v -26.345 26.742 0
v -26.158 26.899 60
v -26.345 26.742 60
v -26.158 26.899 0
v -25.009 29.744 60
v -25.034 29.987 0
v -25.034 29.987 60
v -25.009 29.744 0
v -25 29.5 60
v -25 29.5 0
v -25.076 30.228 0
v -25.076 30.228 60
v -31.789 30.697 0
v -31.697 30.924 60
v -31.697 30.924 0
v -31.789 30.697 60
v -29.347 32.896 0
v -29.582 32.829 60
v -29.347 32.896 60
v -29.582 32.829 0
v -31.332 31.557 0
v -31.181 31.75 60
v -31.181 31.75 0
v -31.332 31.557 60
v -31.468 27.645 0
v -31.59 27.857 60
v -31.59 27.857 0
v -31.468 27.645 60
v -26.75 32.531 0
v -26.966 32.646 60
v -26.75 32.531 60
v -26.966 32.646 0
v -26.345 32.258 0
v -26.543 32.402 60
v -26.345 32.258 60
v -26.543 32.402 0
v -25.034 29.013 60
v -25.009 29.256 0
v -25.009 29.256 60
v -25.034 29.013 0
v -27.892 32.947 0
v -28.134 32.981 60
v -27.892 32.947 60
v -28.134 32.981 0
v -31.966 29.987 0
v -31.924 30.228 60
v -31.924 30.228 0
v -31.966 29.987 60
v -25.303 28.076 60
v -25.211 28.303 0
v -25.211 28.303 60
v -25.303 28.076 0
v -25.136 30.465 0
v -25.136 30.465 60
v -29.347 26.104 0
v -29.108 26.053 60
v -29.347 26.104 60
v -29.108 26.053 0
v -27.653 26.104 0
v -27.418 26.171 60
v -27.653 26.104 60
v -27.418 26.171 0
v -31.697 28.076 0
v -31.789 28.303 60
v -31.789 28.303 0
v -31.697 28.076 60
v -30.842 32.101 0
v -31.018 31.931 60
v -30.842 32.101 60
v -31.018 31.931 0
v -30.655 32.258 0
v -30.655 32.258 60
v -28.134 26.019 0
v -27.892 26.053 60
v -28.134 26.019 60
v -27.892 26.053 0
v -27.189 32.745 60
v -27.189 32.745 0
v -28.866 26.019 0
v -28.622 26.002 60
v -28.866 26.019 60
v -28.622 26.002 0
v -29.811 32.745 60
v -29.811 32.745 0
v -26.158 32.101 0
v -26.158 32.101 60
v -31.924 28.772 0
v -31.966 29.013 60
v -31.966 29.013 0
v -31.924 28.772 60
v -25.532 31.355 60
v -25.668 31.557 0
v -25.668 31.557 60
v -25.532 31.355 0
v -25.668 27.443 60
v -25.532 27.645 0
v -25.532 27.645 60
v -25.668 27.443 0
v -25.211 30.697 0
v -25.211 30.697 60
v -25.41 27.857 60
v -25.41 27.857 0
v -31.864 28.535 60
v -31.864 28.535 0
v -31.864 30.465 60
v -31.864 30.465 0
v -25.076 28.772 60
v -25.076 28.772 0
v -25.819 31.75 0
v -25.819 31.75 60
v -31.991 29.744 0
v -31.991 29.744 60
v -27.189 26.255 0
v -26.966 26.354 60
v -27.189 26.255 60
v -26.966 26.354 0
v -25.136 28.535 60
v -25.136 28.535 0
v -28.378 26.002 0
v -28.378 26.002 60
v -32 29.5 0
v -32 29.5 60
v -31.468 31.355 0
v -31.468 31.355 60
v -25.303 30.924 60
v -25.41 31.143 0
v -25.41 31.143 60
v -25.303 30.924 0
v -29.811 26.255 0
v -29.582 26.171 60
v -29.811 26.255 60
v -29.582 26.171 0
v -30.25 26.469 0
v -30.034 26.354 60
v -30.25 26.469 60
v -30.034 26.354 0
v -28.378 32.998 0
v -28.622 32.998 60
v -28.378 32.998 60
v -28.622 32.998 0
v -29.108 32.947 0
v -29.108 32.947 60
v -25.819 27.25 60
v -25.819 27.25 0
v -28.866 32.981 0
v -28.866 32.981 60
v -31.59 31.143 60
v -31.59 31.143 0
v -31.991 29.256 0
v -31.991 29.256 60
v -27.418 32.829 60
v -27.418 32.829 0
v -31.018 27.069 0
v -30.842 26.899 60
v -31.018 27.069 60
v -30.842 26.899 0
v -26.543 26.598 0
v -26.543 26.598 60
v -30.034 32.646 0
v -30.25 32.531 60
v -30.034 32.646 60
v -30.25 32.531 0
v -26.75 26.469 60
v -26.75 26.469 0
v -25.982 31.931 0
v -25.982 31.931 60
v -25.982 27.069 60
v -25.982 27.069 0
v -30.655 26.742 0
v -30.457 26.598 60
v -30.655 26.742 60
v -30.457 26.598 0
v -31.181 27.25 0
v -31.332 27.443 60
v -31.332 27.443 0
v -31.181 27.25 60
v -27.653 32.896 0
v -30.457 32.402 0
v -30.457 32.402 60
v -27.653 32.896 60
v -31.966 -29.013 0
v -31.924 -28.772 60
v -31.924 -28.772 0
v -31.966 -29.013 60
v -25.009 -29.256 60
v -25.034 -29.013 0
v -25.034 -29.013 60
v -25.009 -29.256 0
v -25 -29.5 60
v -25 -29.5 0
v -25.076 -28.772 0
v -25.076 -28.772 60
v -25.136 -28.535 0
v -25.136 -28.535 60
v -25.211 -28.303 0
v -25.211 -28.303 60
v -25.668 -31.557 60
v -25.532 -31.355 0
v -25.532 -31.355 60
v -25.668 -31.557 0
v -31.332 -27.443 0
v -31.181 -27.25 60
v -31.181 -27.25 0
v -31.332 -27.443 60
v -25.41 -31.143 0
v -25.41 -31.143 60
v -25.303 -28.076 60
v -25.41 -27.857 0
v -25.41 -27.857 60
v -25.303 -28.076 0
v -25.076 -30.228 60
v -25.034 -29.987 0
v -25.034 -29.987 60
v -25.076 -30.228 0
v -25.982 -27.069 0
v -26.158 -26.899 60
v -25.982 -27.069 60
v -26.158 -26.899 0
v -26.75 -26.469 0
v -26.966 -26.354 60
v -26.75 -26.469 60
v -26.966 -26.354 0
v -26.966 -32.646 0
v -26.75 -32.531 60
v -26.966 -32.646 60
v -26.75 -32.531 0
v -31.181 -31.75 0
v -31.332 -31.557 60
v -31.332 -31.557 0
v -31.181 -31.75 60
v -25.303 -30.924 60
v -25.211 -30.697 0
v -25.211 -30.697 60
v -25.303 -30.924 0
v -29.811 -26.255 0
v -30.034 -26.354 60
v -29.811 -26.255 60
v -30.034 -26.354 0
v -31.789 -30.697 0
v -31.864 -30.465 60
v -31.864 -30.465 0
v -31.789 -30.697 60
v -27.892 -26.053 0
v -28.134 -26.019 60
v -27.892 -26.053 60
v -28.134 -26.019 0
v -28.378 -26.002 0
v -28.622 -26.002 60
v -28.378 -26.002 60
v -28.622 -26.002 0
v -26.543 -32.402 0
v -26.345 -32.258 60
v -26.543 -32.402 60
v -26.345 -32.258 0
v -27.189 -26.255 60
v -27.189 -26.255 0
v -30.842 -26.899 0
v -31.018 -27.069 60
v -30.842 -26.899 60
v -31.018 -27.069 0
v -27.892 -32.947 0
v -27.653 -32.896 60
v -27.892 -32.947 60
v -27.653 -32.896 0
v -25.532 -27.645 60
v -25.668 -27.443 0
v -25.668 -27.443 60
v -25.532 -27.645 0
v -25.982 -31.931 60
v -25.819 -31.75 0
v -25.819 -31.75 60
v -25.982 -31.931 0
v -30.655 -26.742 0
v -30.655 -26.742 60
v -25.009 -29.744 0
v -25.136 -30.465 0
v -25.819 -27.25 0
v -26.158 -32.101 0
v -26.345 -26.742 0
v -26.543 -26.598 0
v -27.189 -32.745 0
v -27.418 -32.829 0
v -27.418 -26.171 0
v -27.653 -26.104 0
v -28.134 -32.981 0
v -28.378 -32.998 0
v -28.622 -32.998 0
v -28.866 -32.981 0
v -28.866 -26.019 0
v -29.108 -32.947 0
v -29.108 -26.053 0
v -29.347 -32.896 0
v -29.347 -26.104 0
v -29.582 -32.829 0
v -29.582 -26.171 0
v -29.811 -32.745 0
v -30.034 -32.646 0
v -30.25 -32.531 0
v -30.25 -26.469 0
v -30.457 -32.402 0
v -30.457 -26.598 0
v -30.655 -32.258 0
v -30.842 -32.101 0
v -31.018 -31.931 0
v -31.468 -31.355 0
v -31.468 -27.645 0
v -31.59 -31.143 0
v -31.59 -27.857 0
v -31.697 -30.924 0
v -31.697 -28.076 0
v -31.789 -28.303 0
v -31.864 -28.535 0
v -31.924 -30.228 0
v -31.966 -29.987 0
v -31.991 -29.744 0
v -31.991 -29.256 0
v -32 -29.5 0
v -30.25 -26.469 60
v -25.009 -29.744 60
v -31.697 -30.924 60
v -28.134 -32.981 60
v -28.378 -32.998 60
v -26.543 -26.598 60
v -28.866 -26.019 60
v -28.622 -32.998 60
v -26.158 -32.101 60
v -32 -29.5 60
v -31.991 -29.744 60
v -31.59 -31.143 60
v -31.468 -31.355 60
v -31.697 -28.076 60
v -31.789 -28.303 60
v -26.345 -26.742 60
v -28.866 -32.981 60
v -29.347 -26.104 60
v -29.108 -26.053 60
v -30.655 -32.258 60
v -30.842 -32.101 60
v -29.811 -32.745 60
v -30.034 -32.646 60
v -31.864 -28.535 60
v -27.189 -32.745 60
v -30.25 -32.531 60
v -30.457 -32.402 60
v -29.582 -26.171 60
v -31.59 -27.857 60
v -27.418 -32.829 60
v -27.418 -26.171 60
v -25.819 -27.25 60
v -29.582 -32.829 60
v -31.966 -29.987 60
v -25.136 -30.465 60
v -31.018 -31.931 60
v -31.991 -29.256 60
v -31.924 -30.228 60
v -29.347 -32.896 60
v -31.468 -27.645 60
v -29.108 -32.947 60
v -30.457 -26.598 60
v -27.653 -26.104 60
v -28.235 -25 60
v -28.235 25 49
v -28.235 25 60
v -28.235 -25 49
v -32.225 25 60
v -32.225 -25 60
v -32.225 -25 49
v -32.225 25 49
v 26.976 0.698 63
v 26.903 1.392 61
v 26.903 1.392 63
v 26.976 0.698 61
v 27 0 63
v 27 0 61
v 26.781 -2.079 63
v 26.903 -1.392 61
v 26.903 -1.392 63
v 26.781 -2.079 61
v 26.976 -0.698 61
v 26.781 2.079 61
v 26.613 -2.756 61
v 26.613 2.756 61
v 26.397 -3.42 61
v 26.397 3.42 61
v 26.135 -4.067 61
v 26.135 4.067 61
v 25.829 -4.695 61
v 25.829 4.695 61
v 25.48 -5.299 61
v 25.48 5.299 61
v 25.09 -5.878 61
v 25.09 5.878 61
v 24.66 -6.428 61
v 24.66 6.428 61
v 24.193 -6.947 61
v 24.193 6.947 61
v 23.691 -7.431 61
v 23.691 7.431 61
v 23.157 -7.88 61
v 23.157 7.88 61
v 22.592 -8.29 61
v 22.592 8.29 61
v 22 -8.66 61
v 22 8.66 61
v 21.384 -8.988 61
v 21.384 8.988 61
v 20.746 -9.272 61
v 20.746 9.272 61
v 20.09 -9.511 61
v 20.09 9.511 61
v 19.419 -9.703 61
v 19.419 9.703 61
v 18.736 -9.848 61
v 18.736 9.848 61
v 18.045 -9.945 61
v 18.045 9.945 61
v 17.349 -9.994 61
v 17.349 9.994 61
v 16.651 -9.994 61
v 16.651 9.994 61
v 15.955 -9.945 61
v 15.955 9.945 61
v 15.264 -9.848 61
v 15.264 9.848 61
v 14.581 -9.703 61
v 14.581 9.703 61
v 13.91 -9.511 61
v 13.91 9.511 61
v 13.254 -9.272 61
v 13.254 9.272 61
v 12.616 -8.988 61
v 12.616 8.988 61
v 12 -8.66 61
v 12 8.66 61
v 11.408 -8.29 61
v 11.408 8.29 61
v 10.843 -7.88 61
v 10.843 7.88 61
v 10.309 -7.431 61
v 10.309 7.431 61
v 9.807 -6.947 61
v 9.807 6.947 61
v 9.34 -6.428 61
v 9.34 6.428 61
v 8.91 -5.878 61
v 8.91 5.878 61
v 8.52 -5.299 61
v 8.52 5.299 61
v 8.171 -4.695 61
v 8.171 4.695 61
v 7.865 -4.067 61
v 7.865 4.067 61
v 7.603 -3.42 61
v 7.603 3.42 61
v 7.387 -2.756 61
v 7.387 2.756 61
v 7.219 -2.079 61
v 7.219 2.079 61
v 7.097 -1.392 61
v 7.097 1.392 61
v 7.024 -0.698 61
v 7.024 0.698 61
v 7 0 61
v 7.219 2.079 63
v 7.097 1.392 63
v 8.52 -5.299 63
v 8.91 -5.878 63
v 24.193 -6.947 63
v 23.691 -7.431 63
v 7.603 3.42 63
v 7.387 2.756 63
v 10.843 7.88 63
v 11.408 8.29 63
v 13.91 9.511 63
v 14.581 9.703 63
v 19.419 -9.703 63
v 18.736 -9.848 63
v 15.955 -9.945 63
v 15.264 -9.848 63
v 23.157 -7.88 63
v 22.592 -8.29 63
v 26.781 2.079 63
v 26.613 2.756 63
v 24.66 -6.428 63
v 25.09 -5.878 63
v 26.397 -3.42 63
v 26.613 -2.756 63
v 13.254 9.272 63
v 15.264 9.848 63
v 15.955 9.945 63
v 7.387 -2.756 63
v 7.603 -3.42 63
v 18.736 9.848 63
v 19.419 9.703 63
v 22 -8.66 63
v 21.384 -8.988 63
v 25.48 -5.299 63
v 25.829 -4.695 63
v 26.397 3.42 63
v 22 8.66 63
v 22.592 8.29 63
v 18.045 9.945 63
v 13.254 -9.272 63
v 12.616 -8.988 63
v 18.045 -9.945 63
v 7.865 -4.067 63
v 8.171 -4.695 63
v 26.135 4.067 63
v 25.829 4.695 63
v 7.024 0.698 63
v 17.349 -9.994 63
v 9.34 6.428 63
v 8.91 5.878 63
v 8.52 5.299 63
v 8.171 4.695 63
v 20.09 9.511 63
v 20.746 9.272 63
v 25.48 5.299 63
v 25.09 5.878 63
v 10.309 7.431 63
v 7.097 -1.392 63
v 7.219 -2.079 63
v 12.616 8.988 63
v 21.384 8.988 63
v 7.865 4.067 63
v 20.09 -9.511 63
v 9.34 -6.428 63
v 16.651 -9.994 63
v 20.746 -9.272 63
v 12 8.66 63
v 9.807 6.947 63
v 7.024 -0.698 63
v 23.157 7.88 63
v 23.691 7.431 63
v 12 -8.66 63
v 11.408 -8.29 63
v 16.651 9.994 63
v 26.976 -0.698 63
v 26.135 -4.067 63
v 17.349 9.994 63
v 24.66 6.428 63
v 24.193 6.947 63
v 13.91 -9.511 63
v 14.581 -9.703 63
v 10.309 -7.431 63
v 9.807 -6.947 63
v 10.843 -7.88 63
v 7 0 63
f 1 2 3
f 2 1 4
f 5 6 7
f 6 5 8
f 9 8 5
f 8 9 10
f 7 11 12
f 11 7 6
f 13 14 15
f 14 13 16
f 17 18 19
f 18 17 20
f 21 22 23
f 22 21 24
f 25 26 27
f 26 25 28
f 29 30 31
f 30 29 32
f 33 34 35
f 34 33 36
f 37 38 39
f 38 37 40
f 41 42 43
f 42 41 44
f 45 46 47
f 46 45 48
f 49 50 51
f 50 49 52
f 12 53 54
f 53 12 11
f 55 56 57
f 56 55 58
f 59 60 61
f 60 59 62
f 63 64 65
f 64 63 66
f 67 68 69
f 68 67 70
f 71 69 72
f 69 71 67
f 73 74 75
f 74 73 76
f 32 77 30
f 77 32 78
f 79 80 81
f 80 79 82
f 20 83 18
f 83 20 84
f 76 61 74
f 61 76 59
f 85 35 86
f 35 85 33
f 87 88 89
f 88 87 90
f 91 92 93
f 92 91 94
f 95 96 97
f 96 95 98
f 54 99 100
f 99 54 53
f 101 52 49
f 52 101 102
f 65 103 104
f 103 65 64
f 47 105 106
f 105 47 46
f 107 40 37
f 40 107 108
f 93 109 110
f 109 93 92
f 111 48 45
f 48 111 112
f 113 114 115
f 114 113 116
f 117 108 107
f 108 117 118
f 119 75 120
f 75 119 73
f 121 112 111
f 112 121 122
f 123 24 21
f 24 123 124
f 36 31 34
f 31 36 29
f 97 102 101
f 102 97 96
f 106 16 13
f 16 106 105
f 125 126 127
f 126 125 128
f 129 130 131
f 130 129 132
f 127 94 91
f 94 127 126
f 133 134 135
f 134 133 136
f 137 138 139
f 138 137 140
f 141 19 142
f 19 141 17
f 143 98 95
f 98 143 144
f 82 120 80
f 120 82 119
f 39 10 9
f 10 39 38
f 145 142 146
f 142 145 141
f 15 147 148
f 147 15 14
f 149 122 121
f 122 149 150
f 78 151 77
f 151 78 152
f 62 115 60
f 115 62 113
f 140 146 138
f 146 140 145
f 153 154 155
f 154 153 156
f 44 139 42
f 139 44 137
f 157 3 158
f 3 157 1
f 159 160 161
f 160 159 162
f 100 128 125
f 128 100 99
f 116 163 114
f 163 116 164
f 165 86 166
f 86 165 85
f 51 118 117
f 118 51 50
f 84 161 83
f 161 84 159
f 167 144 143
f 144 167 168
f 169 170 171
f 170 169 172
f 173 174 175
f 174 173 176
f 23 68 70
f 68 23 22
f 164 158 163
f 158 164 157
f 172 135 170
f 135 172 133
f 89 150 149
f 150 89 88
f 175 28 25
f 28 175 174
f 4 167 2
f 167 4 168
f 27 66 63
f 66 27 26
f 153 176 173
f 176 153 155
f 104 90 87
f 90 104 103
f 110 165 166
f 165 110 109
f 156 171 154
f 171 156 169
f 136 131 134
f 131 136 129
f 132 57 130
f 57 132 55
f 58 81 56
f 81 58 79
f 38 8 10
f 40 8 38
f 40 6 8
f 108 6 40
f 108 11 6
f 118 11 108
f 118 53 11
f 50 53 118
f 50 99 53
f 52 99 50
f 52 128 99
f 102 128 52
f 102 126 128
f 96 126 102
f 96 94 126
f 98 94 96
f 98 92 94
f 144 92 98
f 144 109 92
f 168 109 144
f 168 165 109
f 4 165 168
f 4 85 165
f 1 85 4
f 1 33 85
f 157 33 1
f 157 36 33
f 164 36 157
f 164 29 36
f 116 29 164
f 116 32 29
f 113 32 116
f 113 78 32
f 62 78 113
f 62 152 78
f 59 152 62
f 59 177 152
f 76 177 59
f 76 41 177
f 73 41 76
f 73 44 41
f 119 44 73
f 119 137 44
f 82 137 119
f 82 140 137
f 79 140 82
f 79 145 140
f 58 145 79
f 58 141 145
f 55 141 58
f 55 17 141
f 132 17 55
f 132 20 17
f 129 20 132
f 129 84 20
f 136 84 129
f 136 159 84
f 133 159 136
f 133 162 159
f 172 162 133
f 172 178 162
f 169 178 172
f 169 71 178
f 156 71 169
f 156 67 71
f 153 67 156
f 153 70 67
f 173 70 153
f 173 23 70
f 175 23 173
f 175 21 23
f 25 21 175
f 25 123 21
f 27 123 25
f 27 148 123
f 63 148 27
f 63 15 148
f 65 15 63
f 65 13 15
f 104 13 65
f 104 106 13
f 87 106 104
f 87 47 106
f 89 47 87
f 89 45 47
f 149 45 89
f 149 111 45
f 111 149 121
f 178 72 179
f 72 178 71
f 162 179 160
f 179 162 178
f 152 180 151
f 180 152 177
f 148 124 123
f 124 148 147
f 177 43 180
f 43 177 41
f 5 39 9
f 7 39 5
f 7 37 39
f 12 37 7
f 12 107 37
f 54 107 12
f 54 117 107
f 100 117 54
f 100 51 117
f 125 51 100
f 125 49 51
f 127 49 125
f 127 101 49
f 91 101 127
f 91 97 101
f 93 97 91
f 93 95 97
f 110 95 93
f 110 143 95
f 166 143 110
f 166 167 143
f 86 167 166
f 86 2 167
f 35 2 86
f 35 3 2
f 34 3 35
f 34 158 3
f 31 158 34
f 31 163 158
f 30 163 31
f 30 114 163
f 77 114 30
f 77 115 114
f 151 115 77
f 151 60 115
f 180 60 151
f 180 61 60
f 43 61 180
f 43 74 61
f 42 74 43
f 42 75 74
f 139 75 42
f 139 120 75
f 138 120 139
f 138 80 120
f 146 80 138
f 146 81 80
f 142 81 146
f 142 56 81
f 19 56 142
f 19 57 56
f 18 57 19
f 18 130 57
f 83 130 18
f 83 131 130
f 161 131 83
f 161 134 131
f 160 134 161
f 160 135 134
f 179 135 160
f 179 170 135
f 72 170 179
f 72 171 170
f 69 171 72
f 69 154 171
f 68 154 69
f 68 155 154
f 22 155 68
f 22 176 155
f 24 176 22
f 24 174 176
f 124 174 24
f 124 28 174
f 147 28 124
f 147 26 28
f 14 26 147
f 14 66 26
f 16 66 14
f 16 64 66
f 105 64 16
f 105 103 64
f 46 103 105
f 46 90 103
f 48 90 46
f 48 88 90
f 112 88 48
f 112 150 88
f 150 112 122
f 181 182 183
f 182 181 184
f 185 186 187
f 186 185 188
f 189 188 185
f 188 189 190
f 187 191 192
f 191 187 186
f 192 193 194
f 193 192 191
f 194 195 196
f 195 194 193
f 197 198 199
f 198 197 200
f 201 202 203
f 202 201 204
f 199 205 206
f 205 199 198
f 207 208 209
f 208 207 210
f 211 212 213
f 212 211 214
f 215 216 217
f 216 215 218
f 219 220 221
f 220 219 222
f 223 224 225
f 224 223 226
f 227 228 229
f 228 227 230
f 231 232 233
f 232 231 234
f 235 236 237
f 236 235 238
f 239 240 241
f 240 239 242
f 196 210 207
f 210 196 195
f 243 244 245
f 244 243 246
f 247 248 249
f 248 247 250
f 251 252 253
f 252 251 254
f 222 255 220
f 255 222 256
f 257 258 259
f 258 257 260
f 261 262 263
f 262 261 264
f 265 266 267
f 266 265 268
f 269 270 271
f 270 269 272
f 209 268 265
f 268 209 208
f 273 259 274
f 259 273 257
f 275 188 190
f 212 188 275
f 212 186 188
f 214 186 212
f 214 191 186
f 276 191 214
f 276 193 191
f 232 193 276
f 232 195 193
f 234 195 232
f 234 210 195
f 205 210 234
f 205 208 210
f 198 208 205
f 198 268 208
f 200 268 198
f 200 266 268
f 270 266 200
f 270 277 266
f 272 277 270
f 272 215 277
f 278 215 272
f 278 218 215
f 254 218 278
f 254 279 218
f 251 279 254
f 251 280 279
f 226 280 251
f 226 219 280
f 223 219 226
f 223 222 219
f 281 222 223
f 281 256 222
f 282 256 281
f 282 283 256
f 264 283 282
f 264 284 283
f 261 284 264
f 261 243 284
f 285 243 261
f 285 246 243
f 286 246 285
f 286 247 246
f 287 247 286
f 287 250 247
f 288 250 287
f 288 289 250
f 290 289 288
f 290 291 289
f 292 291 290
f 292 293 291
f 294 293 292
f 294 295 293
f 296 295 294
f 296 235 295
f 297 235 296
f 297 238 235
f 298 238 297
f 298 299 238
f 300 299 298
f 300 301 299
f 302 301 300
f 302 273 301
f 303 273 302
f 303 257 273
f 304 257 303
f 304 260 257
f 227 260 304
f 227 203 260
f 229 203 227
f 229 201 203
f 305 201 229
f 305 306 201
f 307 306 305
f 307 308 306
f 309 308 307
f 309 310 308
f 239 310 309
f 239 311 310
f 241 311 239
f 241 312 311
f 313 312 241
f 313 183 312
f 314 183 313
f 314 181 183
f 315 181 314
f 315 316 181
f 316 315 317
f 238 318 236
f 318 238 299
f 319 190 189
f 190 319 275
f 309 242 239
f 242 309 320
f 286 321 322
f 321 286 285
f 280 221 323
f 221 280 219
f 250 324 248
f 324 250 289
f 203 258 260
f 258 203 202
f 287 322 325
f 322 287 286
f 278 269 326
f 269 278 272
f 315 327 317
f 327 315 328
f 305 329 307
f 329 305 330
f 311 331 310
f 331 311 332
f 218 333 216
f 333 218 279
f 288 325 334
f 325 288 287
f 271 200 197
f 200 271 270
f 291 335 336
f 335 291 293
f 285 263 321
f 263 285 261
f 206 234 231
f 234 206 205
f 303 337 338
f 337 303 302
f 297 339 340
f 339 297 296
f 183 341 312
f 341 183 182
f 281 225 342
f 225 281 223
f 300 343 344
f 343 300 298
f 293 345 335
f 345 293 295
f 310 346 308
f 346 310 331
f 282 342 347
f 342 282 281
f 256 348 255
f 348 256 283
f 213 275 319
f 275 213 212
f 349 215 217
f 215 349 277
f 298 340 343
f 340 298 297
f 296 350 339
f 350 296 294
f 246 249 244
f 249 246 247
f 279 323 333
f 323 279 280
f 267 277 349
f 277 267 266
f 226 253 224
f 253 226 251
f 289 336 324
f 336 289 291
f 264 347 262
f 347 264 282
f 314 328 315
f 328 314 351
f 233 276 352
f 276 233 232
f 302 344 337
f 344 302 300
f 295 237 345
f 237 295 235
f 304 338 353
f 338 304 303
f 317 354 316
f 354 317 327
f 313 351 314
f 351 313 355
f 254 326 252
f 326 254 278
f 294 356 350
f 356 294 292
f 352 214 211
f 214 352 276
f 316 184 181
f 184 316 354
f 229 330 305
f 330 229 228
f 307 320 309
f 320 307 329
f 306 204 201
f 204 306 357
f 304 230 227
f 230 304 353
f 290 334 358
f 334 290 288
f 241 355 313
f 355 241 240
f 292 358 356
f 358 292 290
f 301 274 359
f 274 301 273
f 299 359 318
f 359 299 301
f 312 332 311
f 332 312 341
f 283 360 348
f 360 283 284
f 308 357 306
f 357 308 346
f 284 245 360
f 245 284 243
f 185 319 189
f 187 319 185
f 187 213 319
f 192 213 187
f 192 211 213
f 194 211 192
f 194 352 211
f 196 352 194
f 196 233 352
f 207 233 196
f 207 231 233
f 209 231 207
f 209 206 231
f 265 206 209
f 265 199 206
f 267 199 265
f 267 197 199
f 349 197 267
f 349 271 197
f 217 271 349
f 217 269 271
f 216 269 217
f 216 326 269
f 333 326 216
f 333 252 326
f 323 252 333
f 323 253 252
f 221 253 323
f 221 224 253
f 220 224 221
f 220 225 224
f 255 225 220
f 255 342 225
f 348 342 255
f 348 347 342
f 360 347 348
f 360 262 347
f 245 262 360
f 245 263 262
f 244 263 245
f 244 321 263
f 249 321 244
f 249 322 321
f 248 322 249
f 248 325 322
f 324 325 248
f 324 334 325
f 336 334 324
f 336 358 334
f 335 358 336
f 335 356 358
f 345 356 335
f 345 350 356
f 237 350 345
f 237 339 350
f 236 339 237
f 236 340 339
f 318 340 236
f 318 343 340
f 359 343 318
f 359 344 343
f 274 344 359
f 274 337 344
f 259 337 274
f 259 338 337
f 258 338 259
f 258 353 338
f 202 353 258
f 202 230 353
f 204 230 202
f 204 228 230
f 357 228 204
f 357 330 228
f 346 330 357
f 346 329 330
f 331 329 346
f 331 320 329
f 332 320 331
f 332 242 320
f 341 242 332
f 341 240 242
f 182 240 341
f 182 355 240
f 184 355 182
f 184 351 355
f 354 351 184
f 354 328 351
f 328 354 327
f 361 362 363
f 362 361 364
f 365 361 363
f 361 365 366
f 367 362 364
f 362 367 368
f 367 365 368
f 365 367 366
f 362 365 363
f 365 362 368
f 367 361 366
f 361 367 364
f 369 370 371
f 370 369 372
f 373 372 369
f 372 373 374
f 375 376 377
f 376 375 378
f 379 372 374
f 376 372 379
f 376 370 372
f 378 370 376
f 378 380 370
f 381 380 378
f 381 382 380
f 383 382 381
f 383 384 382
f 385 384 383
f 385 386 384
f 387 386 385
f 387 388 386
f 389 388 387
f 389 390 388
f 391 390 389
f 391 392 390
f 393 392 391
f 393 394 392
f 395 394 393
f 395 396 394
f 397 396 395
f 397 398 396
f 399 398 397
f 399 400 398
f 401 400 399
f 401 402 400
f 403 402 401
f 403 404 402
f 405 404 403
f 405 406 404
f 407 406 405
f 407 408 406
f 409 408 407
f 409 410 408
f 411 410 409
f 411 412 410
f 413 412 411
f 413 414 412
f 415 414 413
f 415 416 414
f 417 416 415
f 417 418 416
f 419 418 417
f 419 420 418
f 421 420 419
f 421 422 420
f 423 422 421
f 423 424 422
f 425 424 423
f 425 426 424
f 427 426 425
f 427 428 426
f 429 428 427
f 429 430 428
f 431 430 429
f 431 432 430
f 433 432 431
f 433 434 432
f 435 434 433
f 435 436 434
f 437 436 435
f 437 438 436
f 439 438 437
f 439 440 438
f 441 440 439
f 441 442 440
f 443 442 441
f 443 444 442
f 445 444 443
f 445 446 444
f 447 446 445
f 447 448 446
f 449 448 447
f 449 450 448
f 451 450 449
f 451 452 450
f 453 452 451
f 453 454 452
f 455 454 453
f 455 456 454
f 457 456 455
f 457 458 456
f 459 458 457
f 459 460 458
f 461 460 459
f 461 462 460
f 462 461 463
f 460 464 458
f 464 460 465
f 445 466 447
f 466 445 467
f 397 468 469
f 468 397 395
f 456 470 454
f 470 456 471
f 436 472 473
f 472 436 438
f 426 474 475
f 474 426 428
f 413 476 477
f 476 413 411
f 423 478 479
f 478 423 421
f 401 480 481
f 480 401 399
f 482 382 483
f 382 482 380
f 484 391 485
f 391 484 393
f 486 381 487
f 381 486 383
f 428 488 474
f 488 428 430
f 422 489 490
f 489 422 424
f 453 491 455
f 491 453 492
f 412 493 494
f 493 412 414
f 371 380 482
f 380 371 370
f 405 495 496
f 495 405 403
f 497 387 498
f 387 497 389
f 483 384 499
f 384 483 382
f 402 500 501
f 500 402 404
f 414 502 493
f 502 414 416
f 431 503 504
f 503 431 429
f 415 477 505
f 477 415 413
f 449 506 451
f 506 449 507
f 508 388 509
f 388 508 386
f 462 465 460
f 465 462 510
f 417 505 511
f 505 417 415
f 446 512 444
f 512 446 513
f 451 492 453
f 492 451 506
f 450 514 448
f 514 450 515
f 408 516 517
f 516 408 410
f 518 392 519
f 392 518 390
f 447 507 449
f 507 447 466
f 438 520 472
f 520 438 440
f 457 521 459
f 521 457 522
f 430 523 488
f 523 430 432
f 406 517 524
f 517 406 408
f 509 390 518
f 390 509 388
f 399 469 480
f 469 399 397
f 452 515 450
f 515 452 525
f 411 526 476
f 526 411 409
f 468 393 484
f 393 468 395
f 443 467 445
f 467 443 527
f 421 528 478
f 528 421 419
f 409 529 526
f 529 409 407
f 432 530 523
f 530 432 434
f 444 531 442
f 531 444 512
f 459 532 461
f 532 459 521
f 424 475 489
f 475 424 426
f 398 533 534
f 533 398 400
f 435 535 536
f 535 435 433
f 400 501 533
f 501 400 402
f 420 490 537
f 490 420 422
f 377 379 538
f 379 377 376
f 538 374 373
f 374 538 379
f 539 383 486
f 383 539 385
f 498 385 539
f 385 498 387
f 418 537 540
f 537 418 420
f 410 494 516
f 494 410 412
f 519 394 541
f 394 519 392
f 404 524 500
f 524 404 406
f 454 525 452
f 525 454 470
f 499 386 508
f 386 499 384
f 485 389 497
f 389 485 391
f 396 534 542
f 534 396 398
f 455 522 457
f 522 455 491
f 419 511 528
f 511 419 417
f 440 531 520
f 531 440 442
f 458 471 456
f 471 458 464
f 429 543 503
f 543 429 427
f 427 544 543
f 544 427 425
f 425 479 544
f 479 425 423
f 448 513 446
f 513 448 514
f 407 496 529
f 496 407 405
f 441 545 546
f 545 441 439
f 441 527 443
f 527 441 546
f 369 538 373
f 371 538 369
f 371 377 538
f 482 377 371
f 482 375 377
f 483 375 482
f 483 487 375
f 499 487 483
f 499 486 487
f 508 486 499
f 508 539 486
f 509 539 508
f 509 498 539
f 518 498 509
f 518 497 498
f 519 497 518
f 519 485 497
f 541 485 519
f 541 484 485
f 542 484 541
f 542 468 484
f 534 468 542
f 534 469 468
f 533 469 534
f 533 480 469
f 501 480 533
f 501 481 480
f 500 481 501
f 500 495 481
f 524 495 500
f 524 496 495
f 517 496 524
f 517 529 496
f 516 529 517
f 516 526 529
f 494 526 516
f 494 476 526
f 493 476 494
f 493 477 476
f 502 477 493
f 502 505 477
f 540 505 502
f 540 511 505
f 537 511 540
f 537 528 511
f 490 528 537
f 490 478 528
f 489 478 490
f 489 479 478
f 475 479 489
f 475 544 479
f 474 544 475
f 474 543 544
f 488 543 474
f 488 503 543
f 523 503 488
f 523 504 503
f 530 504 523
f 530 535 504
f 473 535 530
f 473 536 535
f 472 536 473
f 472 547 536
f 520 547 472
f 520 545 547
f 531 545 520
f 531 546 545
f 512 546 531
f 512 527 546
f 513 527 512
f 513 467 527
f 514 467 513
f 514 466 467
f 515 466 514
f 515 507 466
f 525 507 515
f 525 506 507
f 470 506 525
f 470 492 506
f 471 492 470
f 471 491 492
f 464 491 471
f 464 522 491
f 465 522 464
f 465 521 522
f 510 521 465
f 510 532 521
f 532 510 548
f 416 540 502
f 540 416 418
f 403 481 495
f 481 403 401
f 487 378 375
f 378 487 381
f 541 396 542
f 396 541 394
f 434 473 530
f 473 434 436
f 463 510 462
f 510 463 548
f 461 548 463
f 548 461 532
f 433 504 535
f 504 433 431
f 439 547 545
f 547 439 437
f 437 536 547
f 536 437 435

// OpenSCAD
//
//  Step 3
//  
//  Add pieces to model
//
addPieces();
///////////////////////////////////////////////////////
module addPieces(){
//    import("2_BottomCornerMotorSupportOnePiece.stl");
  
    mh = 60;
  // Fill in holes
    translate([-28.5,29.5,(mh/2)])
      cylinder(h=mh,d=7,center=true,$fn=90);
    translate([-28.5,-29.5,(mh/2)])
      cylinder(h=mh,d=7,center=true,$fn=90);
  // Fill above motor
    translate([-30.23,0,(mh-5.5)])
     cube([3.99,50,11],center=true);
  // Fill in floor hole
    translate([17,0,(mh)+2])
       cylinder(h=2,d=20,center=true,$fn=90);
}
//
//  Step 2
//  
//  Cut Down to one piece
//
//jointThePieces();
///////////////////////////////////////////////////////
module jointThePieces(){
  import("BottomCornerSupportOnePiece.stl");
  translate([-25.23,0,60/2]) rotate([0,-90,0]) import("BottomMotorOnePiece.stl"); 
}
///////////////////////////////////////////////////////
//
//  Step 1
//  
//  Cut Down to one piece
//
//cut2OneCorner();
//cut2OneMotor();
///////////////////////////////////////////////////////
module cut2OneCorner(){
  difference(){
    import("Bottom_Corner_Support.stl");
    mCube=65;

    translate([-mCube-5,0,(mCube/2)-1])
  #    cube([mCube+1,mCube+25,mCube],center=true);
    
    translate([mCube+3,0,(mCube/2)-1])
  #   cube([mCube+1,mCube+25,mCube],center=true);
  }
}
///////////////////////////////////////////////////////
module cut2OneMotor(){
  difference(){
    import("Stepper_Mount.stl");
    mCube=65;

    translate([-mCube-1,0,(mCube/2)-1])
  #    cube([mCube+1,mCube+25,mCube],center=true);
    
    translate([mCube+1,0,(mCube/2)-1])
  #   cube([mCube+1,mCube+25,mCube],center=true);
  }
}
